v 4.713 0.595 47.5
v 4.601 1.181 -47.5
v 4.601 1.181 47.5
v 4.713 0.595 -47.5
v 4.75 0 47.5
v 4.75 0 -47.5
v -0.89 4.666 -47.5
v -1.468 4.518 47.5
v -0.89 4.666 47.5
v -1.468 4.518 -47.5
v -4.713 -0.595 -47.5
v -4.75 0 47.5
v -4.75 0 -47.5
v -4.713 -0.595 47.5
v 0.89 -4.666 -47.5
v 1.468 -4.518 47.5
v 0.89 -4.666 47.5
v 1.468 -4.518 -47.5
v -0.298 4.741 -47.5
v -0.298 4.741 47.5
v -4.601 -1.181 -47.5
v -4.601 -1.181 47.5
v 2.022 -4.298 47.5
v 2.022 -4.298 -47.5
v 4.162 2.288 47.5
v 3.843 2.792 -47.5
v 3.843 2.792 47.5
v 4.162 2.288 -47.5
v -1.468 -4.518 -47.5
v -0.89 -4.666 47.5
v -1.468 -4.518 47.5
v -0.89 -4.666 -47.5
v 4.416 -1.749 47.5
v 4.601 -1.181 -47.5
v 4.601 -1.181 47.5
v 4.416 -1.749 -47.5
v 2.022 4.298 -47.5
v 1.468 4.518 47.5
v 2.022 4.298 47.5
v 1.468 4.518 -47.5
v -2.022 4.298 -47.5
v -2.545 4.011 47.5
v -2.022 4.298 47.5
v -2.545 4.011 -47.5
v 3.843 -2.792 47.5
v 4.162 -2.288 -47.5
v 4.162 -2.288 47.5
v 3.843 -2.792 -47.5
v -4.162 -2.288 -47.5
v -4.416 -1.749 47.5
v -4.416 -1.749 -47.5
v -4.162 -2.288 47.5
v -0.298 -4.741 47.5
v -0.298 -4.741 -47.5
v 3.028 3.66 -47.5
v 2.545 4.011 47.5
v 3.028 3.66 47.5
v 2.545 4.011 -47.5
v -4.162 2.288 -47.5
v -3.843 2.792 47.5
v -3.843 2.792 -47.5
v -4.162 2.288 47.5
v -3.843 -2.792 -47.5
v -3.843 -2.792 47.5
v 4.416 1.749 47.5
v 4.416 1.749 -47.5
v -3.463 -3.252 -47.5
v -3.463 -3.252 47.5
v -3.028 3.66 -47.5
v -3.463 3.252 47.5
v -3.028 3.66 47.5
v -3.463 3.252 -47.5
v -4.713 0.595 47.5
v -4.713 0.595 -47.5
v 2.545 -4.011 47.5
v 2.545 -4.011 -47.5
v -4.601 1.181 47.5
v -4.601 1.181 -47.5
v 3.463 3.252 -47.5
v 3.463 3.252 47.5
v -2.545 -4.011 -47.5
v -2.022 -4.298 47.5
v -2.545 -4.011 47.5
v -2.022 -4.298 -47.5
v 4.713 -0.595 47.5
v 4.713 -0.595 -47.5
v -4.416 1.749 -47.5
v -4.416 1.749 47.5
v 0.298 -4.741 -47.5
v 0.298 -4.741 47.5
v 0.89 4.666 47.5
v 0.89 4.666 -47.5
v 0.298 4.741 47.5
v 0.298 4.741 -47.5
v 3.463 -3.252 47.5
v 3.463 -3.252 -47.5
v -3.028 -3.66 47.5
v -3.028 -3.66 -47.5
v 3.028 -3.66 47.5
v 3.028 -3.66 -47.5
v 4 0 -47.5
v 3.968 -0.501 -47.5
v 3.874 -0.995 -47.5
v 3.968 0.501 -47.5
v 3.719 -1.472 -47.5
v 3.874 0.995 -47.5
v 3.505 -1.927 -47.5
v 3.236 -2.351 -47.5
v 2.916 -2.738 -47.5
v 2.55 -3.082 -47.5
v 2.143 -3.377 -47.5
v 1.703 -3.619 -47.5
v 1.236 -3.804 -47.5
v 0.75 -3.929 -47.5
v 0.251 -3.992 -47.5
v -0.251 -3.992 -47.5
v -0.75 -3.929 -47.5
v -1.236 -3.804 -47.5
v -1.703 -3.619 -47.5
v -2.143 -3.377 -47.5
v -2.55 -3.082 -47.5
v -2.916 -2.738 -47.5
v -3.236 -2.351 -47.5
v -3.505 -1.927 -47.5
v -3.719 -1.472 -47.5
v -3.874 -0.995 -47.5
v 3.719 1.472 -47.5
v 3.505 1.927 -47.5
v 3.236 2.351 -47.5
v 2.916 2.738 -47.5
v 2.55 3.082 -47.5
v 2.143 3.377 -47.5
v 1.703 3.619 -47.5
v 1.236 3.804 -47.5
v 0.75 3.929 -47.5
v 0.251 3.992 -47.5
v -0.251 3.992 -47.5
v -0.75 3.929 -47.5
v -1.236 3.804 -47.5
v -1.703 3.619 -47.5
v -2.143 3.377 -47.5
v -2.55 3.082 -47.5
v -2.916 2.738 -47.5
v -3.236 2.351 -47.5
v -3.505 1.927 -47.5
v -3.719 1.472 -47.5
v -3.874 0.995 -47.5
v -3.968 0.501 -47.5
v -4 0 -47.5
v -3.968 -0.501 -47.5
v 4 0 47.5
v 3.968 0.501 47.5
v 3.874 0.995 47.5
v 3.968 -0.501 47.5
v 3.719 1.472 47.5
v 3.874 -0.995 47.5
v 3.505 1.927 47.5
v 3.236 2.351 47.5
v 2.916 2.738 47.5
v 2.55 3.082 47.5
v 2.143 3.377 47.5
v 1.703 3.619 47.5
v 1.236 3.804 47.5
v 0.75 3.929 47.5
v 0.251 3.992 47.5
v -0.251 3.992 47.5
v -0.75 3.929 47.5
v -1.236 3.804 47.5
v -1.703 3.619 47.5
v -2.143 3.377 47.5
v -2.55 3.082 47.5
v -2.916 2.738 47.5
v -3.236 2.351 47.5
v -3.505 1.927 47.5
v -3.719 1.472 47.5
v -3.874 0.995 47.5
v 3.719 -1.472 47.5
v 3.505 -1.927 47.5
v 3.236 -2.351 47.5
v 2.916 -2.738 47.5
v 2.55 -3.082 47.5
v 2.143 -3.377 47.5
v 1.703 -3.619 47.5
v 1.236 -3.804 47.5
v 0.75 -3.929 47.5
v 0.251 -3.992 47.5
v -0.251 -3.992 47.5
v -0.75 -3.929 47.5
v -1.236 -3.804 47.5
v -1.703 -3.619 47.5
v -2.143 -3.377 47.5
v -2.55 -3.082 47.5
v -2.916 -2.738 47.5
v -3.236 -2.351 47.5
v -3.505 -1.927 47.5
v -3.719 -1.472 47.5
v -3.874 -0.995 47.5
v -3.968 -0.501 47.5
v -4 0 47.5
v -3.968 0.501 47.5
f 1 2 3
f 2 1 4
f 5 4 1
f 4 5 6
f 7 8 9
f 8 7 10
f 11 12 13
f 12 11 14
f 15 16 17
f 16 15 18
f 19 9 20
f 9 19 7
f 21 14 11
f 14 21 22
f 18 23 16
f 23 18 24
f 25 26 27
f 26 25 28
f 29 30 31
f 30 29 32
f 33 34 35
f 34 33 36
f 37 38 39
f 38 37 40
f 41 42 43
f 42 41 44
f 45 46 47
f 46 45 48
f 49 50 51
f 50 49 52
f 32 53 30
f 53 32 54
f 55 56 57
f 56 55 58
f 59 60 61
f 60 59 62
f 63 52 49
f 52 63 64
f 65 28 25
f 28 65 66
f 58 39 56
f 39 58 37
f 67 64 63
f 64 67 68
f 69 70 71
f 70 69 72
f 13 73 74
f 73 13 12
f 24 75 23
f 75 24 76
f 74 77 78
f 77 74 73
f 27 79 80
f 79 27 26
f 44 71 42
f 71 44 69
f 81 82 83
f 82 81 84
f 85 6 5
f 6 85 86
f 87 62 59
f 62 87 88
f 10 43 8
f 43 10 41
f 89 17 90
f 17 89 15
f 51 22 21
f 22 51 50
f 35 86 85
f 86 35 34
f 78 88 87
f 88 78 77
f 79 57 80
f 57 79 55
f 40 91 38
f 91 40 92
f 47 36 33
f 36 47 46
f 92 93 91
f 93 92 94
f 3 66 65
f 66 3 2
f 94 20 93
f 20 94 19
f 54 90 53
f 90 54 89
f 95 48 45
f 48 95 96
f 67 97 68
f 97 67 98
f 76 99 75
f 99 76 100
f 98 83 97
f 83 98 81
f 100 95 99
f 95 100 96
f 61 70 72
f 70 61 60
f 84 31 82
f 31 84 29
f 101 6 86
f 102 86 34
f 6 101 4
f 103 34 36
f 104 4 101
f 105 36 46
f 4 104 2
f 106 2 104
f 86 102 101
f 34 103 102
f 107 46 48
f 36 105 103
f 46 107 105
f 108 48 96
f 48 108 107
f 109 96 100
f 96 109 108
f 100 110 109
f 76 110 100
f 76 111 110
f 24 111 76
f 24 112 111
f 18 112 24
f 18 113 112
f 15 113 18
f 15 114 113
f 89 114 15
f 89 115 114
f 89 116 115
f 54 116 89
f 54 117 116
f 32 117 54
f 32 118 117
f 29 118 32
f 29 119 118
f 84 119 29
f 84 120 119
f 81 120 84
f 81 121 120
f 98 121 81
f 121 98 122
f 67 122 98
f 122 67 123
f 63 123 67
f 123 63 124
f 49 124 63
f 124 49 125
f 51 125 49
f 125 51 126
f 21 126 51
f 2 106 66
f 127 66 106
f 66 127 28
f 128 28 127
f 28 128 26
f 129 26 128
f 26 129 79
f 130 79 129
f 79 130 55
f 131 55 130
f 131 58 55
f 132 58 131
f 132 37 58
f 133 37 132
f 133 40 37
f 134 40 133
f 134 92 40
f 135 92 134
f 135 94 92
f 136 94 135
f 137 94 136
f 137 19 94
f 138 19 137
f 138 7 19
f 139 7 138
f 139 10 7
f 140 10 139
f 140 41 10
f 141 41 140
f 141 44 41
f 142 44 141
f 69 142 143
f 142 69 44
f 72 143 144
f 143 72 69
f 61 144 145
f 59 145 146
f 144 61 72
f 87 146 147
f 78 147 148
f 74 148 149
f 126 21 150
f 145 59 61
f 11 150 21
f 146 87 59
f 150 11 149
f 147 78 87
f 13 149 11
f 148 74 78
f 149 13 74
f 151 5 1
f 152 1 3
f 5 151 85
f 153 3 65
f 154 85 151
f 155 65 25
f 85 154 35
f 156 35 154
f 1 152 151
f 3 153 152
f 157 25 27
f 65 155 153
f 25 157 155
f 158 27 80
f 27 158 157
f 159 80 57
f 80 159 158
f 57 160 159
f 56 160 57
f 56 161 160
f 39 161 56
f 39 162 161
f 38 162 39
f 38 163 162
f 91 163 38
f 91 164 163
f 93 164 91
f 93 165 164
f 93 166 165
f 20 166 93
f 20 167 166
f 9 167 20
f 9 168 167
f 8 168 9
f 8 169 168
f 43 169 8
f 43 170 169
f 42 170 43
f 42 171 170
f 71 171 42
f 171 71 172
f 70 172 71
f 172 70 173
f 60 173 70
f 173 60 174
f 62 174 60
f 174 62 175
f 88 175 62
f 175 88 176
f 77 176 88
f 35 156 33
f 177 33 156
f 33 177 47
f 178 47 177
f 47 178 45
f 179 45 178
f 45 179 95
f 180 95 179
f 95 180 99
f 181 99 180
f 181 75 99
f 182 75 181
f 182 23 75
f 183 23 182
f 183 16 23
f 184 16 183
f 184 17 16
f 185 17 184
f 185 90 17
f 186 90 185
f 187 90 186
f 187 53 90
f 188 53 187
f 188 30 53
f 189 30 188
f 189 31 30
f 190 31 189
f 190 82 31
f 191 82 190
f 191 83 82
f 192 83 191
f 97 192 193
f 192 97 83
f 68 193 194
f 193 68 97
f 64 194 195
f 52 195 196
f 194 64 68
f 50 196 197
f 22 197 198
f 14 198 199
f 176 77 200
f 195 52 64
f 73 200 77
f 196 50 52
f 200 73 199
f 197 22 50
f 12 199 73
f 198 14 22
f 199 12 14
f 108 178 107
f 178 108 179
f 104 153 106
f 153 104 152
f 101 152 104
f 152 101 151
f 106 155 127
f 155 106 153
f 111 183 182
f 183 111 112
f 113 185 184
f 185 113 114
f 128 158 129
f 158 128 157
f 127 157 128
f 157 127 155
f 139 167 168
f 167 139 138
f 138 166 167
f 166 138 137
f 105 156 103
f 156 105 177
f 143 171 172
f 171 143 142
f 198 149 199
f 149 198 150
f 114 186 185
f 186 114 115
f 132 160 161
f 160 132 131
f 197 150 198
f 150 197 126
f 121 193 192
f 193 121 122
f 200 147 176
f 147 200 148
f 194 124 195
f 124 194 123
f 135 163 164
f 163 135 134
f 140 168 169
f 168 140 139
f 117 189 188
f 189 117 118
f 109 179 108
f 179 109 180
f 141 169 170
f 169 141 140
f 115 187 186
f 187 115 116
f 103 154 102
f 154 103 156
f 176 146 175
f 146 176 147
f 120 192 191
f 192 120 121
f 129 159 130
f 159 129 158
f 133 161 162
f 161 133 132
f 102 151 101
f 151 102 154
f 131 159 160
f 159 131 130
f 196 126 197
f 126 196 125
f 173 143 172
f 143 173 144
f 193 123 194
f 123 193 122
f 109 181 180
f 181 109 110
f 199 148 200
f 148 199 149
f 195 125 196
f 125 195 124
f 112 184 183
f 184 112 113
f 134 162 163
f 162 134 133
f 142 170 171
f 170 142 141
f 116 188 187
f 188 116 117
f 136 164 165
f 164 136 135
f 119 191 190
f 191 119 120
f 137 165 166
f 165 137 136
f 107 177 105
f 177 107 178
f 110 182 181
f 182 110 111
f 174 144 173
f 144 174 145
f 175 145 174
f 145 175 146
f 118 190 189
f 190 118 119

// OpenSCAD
$fn = 50;


difference() {
	union() {
		translate(v = [0, 0, -47.5000000000]) {
			cylinder(h = 95, r = 4.7500000000);
		}
	}
	union() {
		translate(v = [0, 0, -100.0000000000]) {
			cylinder(h = 200, r = 4.0000000000);
		}
	}
}
